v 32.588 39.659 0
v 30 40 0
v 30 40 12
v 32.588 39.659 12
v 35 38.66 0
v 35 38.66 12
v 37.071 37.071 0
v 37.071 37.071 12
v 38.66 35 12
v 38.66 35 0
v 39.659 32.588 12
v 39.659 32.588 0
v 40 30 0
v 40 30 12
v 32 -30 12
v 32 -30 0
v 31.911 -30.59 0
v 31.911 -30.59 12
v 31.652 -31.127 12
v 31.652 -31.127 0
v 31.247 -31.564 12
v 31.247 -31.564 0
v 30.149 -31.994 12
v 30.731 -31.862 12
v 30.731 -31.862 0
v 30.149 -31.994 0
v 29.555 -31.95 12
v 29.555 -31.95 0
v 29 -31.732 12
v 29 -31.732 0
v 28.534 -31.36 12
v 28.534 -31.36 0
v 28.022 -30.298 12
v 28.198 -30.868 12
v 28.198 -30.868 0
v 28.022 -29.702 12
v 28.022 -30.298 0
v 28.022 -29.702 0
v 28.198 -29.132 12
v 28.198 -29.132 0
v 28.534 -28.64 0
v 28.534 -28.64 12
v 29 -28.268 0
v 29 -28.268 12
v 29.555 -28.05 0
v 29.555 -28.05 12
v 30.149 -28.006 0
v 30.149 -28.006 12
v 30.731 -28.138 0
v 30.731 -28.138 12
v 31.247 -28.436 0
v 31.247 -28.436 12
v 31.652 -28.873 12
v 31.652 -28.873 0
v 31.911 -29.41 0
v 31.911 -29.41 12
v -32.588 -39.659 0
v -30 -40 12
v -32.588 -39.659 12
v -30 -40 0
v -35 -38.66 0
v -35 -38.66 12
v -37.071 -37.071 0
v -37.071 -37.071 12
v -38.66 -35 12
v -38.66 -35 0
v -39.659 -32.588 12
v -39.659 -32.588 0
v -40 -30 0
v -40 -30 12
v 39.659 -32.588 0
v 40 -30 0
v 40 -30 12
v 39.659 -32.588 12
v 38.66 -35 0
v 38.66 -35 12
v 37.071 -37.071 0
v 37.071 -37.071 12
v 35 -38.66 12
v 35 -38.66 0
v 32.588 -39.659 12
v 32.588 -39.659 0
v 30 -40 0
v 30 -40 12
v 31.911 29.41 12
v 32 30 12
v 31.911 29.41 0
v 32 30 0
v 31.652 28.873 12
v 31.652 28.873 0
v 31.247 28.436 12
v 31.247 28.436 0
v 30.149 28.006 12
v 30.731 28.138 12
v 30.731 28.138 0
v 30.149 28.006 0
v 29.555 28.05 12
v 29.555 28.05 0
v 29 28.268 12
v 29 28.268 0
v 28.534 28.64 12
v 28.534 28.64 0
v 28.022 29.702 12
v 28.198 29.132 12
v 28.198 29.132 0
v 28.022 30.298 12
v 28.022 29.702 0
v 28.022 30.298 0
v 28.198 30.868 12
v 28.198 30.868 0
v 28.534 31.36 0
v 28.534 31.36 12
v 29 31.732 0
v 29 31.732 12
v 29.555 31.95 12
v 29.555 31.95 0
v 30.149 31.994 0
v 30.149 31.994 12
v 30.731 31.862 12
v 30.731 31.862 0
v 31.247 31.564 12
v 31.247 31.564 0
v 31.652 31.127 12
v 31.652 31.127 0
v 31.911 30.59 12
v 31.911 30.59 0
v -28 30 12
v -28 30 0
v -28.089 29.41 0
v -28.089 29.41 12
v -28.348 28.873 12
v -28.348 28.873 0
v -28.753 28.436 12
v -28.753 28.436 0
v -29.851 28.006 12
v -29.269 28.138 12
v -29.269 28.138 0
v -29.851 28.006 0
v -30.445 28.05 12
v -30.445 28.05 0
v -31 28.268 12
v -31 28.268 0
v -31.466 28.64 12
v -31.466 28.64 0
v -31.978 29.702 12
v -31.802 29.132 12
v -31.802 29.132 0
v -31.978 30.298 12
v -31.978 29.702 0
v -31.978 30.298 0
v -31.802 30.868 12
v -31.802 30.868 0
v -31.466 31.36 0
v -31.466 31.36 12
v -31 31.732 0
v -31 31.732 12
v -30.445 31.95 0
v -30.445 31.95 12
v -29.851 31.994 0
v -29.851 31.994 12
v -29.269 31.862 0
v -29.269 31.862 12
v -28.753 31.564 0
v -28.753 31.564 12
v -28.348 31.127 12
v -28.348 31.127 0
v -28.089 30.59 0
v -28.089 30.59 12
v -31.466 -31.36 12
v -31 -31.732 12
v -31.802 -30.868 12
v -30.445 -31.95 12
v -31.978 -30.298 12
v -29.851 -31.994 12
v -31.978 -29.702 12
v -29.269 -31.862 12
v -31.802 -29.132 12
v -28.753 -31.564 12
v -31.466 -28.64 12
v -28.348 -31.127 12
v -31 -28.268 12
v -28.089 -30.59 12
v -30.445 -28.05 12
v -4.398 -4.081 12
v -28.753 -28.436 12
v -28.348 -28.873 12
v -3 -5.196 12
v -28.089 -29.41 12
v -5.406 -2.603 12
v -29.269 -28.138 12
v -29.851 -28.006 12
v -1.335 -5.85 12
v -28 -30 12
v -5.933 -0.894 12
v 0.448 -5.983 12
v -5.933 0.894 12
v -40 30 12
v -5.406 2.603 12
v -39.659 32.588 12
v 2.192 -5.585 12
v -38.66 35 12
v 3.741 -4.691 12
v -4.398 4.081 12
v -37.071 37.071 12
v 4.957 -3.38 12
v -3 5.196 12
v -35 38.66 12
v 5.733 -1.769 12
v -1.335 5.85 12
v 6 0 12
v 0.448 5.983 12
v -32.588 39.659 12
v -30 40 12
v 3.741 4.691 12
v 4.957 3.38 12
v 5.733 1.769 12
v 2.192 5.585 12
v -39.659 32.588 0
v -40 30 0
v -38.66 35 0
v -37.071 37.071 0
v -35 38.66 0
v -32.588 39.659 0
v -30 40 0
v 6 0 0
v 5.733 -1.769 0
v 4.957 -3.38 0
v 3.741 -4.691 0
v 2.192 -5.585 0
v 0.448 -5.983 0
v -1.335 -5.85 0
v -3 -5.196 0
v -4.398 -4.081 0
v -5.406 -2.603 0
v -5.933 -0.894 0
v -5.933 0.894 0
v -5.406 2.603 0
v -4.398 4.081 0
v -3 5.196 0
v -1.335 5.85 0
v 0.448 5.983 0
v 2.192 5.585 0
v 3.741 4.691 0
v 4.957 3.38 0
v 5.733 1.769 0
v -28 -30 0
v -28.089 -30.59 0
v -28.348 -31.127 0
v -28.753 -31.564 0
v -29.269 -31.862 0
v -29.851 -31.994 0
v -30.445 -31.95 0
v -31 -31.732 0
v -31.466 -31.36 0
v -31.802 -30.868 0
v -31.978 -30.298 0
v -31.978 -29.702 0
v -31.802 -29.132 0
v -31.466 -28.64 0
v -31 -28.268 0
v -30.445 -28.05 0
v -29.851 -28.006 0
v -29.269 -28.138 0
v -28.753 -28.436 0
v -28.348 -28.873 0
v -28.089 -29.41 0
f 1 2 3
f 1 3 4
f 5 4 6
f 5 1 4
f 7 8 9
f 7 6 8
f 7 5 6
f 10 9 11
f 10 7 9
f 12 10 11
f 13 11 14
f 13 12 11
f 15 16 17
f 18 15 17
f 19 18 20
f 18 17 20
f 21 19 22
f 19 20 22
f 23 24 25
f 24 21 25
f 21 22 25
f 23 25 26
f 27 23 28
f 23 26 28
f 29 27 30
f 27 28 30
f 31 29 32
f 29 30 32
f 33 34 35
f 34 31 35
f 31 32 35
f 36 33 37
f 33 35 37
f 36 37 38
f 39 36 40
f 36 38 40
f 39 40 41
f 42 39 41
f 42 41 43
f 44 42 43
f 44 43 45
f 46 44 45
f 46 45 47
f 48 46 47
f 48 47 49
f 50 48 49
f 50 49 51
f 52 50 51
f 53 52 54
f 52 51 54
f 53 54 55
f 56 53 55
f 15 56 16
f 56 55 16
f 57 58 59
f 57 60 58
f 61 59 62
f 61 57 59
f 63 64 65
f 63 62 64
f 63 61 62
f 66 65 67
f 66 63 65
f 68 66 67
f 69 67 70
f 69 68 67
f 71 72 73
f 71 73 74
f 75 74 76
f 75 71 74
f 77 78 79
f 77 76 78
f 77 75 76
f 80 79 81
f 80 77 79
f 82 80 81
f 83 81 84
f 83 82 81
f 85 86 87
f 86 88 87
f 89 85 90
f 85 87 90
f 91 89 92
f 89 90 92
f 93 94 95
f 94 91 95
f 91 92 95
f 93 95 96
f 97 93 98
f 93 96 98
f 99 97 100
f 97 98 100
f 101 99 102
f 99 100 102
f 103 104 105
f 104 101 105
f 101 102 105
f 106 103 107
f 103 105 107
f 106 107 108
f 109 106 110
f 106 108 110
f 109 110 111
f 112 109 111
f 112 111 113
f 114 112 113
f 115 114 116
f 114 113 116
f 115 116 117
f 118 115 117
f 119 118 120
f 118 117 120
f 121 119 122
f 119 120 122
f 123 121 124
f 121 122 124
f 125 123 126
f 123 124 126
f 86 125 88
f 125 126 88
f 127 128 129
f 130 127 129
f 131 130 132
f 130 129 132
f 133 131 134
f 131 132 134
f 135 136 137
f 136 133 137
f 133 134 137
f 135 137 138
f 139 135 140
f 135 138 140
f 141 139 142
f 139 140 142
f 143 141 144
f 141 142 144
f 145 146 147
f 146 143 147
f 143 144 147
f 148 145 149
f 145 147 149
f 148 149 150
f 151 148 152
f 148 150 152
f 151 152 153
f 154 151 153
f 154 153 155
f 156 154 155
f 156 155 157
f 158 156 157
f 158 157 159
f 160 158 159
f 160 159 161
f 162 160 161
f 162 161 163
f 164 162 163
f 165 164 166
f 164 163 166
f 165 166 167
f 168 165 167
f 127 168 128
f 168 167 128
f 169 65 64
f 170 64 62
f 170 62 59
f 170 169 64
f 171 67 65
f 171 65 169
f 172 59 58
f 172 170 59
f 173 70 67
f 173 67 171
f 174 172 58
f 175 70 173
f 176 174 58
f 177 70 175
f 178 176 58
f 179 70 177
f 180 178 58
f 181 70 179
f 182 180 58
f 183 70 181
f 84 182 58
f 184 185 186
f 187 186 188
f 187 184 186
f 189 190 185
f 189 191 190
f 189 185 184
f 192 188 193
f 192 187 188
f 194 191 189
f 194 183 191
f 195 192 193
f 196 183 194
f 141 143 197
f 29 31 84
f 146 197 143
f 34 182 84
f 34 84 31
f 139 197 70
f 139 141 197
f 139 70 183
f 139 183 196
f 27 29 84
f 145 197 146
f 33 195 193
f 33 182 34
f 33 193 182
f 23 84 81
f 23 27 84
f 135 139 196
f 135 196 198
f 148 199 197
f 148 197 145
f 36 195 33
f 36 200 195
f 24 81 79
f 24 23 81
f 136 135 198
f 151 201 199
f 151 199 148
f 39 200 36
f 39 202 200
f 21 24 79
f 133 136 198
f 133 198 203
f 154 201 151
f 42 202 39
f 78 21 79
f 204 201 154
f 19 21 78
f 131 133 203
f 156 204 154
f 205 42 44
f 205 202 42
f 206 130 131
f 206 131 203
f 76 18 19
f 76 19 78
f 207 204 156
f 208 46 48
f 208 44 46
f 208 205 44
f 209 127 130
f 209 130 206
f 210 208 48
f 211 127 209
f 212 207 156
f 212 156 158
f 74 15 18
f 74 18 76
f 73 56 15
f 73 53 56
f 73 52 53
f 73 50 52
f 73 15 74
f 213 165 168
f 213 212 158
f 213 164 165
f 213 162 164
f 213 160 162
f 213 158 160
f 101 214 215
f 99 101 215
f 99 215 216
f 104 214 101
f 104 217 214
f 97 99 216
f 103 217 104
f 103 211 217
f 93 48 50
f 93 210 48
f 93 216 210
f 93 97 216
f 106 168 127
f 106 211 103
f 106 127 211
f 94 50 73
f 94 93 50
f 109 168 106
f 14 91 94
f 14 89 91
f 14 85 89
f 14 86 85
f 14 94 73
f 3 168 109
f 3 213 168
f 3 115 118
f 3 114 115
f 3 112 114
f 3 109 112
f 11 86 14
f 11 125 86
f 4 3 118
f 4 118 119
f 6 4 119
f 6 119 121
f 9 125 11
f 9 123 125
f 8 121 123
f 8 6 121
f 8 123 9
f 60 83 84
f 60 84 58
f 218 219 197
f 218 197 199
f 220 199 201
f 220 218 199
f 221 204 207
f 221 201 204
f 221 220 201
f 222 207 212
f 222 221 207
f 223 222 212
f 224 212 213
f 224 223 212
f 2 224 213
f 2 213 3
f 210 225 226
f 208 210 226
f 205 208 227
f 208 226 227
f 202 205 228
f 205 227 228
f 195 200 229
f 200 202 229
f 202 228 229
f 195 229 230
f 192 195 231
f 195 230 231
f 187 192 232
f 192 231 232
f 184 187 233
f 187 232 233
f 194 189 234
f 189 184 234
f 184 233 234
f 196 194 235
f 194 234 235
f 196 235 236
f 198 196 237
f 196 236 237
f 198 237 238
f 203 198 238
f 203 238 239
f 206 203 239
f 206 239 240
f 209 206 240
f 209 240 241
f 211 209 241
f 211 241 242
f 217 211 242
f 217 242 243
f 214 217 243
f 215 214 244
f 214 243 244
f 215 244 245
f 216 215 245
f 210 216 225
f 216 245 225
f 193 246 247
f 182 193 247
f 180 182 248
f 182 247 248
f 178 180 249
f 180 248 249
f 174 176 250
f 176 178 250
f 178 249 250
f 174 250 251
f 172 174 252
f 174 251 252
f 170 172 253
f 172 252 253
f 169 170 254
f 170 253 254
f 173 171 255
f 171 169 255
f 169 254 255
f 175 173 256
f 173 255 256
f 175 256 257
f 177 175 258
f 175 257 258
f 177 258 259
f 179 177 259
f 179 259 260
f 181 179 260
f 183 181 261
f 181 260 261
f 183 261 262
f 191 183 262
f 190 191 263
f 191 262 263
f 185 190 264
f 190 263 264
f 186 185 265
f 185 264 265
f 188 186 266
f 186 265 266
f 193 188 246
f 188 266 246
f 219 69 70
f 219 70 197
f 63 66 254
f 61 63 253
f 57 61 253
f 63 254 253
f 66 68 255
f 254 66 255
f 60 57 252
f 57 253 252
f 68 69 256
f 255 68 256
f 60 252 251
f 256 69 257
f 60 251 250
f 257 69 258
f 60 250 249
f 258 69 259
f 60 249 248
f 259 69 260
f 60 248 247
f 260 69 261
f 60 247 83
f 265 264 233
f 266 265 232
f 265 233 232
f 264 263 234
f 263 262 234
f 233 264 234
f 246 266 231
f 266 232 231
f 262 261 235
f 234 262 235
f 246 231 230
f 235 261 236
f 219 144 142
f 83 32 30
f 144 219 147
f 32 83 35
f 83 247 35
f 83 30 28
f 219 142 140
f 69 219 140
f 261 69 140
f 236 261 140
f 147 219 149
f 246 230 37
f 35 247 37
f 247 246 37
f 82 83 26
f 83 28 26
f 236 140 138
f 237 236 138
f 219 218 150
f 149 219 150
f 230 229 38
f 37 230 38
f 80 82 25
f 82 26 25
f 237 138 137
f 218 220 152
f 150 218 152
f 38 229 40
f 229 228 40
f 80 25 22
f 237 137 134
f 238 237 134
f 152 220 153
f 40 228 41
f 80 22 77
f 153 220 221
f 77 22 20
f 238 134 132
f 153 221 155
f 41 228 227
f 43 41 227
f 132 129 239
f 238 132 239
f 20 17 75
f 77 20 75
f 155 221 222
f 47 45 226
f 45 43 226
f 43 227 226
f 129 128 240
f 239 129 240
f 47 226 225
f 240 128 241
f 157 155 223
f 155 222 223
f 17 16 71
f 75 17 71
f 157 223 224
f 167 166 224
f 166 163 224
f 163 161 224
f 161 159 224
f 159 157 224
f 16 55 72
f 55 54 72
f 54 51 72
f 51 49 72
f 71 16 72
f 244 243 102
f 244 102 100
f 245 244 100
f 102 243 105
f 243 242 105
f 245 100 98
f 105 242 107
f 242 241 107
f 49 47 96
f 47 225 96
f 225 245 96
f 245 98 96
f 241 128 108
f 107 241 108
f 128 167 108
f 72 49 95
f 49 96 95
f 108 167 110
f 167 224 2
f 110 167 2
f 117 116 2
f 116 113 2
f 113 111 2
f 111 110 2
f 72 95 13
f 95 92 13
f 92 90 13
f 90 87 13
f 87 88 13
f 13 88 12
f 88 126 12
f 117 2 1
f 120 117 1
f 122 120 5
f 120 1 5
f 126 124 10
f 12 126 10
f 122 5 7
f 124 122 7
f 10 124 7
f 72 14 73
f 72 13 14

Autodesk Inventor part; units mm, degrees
ref_plane "YZ Plane" through (0, 0, 0) normal (1, 0, 0) x (0, 1, 0)
ref_plane "XZ Plane" through (0, 0, 0) normal (0, 1, 0) x (-1, 0, 0)
ref_plane "Plano de trabalho1" through (0, 0, 0) normal (0, 0, 1) x (1, 0, 0)
sketch "Esboço1" plane through (0, 0, 0) normal (0, 0, 1) x (1, 0, 0)
  arc A0 (-40, -30) -> (-30, -40) centre (-30, -30) ccw
  line L0 (30, -40) -> (-30, -40)
  arc A1 (30, -40) -> (40, -30) centre (30, -30) ccw
  line L1 (40, 30) -> (40, -30)
  arc A2 (40, 30) -> (30, 40) centre (30, 30) ccw
  line L2 (-30, 40) -> (30, 40)
  arc A3 (-30, 40) -> (-40, 30) centre (-30, 30) ccw
  line L3 (-40, -30) -> (-40, 30)
  circle A4 centre (0, 0) radius 5
  circle A5 centre (0, 0) radius 6
  circle A6 centre (30, 30) radius 2
  circle A7 centre (30, -30) radius 2
  circle A8 centre (-30, -30) radius 2
  circle A9 centre (-30, 30) radius 2
  point P0 (0, 0)
  dimension "d0" = 12
  dimension "d3" = 4
  dimension "d4" = 4
  dimension "d5" = 4
  dimension "d6" = 4
  dimension "d7" = 80
extrude "Extrusão1" add sketch "Esboço1" along normal blind 12 contours L3 A3 L2 A2 L1 A1 L0 A0
equation "\"d3\" = d6"
equation "\"d4\" = d6"
equation "\"d5\" = d6"
properties part number "corpo_01b"
